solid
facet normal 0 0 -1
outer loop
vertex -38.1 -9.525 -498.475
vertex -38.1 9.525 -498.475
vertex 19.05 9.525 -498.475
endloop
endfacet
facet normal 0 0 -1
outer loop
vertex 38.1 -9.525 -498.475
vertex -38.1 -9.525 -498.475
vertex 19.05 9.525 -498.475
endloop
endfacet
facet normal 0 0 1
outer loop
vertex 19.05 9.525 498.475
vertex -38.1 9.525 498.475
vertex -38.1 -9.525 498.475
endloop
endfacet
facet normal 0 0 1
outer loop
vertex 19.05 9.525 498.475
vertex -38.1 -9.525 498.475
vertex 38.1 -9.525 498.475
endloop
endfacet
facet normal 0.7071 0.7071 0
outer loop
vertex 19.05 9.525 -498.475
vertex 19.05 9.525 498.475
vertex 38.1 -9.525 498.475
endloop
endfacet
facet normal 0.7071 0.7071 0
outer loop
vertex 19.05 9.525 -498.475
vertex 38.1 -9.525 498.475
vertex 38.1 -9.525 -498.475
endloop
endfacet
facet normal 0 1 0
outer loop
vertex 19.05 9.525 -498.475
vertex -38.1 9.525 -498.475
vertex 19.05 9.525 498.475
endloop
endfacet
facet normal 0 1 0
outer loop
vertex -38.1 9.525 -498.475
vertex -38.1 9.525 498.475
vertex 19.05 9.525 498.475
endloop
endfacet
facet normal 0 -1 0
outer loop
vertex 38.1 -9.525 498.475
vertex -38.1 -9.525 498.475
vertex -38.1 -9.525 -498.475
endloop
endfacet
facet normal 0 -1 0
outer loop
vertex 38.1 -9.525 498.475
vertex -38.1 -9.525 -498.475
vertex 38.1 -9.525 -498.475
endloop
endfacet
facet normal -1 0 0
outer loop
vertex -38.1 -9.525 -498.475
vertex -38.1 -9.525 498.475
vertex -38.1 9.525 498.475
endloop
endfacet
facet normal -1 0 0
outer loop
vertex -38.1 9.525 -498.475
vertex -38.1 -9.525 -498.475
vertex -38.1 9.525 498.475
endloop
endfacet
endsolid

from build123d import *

# Parameters (mm, degrees)
F0_W     = 76.2
F0_H     = 19.05
F1_DEPTH = 498.475
F2_SIZE2 = 19.04999
F2_SIZE  = 19.04999


# Not quite as in the source:
# - a fillet or chamfer is up to 0.001 mm smaller than in the source, because OpenCascade refuses the exact size


with BuildPart() as f1:
    # F0 (on Top) → F1 (new body, symmetric)
    with BuildSketch(Plane.XY):
        Rectangle(F0_W, F0_H)
    extrude(amount=F1_DEPTH, both=True)

    # F2 (size 19.05 and 19.05 in the source; OpenCascade refuses exactly that, so slightly less here)
    f2_edges = [f1.edges().sort_by_distance(p)[0] for p in [
        (38.1, 9.525, 0),
    ]]
    chamfer(f2_edges, length=F2_SIZE, length2=F2_SIZE2)


solid = f1.part
